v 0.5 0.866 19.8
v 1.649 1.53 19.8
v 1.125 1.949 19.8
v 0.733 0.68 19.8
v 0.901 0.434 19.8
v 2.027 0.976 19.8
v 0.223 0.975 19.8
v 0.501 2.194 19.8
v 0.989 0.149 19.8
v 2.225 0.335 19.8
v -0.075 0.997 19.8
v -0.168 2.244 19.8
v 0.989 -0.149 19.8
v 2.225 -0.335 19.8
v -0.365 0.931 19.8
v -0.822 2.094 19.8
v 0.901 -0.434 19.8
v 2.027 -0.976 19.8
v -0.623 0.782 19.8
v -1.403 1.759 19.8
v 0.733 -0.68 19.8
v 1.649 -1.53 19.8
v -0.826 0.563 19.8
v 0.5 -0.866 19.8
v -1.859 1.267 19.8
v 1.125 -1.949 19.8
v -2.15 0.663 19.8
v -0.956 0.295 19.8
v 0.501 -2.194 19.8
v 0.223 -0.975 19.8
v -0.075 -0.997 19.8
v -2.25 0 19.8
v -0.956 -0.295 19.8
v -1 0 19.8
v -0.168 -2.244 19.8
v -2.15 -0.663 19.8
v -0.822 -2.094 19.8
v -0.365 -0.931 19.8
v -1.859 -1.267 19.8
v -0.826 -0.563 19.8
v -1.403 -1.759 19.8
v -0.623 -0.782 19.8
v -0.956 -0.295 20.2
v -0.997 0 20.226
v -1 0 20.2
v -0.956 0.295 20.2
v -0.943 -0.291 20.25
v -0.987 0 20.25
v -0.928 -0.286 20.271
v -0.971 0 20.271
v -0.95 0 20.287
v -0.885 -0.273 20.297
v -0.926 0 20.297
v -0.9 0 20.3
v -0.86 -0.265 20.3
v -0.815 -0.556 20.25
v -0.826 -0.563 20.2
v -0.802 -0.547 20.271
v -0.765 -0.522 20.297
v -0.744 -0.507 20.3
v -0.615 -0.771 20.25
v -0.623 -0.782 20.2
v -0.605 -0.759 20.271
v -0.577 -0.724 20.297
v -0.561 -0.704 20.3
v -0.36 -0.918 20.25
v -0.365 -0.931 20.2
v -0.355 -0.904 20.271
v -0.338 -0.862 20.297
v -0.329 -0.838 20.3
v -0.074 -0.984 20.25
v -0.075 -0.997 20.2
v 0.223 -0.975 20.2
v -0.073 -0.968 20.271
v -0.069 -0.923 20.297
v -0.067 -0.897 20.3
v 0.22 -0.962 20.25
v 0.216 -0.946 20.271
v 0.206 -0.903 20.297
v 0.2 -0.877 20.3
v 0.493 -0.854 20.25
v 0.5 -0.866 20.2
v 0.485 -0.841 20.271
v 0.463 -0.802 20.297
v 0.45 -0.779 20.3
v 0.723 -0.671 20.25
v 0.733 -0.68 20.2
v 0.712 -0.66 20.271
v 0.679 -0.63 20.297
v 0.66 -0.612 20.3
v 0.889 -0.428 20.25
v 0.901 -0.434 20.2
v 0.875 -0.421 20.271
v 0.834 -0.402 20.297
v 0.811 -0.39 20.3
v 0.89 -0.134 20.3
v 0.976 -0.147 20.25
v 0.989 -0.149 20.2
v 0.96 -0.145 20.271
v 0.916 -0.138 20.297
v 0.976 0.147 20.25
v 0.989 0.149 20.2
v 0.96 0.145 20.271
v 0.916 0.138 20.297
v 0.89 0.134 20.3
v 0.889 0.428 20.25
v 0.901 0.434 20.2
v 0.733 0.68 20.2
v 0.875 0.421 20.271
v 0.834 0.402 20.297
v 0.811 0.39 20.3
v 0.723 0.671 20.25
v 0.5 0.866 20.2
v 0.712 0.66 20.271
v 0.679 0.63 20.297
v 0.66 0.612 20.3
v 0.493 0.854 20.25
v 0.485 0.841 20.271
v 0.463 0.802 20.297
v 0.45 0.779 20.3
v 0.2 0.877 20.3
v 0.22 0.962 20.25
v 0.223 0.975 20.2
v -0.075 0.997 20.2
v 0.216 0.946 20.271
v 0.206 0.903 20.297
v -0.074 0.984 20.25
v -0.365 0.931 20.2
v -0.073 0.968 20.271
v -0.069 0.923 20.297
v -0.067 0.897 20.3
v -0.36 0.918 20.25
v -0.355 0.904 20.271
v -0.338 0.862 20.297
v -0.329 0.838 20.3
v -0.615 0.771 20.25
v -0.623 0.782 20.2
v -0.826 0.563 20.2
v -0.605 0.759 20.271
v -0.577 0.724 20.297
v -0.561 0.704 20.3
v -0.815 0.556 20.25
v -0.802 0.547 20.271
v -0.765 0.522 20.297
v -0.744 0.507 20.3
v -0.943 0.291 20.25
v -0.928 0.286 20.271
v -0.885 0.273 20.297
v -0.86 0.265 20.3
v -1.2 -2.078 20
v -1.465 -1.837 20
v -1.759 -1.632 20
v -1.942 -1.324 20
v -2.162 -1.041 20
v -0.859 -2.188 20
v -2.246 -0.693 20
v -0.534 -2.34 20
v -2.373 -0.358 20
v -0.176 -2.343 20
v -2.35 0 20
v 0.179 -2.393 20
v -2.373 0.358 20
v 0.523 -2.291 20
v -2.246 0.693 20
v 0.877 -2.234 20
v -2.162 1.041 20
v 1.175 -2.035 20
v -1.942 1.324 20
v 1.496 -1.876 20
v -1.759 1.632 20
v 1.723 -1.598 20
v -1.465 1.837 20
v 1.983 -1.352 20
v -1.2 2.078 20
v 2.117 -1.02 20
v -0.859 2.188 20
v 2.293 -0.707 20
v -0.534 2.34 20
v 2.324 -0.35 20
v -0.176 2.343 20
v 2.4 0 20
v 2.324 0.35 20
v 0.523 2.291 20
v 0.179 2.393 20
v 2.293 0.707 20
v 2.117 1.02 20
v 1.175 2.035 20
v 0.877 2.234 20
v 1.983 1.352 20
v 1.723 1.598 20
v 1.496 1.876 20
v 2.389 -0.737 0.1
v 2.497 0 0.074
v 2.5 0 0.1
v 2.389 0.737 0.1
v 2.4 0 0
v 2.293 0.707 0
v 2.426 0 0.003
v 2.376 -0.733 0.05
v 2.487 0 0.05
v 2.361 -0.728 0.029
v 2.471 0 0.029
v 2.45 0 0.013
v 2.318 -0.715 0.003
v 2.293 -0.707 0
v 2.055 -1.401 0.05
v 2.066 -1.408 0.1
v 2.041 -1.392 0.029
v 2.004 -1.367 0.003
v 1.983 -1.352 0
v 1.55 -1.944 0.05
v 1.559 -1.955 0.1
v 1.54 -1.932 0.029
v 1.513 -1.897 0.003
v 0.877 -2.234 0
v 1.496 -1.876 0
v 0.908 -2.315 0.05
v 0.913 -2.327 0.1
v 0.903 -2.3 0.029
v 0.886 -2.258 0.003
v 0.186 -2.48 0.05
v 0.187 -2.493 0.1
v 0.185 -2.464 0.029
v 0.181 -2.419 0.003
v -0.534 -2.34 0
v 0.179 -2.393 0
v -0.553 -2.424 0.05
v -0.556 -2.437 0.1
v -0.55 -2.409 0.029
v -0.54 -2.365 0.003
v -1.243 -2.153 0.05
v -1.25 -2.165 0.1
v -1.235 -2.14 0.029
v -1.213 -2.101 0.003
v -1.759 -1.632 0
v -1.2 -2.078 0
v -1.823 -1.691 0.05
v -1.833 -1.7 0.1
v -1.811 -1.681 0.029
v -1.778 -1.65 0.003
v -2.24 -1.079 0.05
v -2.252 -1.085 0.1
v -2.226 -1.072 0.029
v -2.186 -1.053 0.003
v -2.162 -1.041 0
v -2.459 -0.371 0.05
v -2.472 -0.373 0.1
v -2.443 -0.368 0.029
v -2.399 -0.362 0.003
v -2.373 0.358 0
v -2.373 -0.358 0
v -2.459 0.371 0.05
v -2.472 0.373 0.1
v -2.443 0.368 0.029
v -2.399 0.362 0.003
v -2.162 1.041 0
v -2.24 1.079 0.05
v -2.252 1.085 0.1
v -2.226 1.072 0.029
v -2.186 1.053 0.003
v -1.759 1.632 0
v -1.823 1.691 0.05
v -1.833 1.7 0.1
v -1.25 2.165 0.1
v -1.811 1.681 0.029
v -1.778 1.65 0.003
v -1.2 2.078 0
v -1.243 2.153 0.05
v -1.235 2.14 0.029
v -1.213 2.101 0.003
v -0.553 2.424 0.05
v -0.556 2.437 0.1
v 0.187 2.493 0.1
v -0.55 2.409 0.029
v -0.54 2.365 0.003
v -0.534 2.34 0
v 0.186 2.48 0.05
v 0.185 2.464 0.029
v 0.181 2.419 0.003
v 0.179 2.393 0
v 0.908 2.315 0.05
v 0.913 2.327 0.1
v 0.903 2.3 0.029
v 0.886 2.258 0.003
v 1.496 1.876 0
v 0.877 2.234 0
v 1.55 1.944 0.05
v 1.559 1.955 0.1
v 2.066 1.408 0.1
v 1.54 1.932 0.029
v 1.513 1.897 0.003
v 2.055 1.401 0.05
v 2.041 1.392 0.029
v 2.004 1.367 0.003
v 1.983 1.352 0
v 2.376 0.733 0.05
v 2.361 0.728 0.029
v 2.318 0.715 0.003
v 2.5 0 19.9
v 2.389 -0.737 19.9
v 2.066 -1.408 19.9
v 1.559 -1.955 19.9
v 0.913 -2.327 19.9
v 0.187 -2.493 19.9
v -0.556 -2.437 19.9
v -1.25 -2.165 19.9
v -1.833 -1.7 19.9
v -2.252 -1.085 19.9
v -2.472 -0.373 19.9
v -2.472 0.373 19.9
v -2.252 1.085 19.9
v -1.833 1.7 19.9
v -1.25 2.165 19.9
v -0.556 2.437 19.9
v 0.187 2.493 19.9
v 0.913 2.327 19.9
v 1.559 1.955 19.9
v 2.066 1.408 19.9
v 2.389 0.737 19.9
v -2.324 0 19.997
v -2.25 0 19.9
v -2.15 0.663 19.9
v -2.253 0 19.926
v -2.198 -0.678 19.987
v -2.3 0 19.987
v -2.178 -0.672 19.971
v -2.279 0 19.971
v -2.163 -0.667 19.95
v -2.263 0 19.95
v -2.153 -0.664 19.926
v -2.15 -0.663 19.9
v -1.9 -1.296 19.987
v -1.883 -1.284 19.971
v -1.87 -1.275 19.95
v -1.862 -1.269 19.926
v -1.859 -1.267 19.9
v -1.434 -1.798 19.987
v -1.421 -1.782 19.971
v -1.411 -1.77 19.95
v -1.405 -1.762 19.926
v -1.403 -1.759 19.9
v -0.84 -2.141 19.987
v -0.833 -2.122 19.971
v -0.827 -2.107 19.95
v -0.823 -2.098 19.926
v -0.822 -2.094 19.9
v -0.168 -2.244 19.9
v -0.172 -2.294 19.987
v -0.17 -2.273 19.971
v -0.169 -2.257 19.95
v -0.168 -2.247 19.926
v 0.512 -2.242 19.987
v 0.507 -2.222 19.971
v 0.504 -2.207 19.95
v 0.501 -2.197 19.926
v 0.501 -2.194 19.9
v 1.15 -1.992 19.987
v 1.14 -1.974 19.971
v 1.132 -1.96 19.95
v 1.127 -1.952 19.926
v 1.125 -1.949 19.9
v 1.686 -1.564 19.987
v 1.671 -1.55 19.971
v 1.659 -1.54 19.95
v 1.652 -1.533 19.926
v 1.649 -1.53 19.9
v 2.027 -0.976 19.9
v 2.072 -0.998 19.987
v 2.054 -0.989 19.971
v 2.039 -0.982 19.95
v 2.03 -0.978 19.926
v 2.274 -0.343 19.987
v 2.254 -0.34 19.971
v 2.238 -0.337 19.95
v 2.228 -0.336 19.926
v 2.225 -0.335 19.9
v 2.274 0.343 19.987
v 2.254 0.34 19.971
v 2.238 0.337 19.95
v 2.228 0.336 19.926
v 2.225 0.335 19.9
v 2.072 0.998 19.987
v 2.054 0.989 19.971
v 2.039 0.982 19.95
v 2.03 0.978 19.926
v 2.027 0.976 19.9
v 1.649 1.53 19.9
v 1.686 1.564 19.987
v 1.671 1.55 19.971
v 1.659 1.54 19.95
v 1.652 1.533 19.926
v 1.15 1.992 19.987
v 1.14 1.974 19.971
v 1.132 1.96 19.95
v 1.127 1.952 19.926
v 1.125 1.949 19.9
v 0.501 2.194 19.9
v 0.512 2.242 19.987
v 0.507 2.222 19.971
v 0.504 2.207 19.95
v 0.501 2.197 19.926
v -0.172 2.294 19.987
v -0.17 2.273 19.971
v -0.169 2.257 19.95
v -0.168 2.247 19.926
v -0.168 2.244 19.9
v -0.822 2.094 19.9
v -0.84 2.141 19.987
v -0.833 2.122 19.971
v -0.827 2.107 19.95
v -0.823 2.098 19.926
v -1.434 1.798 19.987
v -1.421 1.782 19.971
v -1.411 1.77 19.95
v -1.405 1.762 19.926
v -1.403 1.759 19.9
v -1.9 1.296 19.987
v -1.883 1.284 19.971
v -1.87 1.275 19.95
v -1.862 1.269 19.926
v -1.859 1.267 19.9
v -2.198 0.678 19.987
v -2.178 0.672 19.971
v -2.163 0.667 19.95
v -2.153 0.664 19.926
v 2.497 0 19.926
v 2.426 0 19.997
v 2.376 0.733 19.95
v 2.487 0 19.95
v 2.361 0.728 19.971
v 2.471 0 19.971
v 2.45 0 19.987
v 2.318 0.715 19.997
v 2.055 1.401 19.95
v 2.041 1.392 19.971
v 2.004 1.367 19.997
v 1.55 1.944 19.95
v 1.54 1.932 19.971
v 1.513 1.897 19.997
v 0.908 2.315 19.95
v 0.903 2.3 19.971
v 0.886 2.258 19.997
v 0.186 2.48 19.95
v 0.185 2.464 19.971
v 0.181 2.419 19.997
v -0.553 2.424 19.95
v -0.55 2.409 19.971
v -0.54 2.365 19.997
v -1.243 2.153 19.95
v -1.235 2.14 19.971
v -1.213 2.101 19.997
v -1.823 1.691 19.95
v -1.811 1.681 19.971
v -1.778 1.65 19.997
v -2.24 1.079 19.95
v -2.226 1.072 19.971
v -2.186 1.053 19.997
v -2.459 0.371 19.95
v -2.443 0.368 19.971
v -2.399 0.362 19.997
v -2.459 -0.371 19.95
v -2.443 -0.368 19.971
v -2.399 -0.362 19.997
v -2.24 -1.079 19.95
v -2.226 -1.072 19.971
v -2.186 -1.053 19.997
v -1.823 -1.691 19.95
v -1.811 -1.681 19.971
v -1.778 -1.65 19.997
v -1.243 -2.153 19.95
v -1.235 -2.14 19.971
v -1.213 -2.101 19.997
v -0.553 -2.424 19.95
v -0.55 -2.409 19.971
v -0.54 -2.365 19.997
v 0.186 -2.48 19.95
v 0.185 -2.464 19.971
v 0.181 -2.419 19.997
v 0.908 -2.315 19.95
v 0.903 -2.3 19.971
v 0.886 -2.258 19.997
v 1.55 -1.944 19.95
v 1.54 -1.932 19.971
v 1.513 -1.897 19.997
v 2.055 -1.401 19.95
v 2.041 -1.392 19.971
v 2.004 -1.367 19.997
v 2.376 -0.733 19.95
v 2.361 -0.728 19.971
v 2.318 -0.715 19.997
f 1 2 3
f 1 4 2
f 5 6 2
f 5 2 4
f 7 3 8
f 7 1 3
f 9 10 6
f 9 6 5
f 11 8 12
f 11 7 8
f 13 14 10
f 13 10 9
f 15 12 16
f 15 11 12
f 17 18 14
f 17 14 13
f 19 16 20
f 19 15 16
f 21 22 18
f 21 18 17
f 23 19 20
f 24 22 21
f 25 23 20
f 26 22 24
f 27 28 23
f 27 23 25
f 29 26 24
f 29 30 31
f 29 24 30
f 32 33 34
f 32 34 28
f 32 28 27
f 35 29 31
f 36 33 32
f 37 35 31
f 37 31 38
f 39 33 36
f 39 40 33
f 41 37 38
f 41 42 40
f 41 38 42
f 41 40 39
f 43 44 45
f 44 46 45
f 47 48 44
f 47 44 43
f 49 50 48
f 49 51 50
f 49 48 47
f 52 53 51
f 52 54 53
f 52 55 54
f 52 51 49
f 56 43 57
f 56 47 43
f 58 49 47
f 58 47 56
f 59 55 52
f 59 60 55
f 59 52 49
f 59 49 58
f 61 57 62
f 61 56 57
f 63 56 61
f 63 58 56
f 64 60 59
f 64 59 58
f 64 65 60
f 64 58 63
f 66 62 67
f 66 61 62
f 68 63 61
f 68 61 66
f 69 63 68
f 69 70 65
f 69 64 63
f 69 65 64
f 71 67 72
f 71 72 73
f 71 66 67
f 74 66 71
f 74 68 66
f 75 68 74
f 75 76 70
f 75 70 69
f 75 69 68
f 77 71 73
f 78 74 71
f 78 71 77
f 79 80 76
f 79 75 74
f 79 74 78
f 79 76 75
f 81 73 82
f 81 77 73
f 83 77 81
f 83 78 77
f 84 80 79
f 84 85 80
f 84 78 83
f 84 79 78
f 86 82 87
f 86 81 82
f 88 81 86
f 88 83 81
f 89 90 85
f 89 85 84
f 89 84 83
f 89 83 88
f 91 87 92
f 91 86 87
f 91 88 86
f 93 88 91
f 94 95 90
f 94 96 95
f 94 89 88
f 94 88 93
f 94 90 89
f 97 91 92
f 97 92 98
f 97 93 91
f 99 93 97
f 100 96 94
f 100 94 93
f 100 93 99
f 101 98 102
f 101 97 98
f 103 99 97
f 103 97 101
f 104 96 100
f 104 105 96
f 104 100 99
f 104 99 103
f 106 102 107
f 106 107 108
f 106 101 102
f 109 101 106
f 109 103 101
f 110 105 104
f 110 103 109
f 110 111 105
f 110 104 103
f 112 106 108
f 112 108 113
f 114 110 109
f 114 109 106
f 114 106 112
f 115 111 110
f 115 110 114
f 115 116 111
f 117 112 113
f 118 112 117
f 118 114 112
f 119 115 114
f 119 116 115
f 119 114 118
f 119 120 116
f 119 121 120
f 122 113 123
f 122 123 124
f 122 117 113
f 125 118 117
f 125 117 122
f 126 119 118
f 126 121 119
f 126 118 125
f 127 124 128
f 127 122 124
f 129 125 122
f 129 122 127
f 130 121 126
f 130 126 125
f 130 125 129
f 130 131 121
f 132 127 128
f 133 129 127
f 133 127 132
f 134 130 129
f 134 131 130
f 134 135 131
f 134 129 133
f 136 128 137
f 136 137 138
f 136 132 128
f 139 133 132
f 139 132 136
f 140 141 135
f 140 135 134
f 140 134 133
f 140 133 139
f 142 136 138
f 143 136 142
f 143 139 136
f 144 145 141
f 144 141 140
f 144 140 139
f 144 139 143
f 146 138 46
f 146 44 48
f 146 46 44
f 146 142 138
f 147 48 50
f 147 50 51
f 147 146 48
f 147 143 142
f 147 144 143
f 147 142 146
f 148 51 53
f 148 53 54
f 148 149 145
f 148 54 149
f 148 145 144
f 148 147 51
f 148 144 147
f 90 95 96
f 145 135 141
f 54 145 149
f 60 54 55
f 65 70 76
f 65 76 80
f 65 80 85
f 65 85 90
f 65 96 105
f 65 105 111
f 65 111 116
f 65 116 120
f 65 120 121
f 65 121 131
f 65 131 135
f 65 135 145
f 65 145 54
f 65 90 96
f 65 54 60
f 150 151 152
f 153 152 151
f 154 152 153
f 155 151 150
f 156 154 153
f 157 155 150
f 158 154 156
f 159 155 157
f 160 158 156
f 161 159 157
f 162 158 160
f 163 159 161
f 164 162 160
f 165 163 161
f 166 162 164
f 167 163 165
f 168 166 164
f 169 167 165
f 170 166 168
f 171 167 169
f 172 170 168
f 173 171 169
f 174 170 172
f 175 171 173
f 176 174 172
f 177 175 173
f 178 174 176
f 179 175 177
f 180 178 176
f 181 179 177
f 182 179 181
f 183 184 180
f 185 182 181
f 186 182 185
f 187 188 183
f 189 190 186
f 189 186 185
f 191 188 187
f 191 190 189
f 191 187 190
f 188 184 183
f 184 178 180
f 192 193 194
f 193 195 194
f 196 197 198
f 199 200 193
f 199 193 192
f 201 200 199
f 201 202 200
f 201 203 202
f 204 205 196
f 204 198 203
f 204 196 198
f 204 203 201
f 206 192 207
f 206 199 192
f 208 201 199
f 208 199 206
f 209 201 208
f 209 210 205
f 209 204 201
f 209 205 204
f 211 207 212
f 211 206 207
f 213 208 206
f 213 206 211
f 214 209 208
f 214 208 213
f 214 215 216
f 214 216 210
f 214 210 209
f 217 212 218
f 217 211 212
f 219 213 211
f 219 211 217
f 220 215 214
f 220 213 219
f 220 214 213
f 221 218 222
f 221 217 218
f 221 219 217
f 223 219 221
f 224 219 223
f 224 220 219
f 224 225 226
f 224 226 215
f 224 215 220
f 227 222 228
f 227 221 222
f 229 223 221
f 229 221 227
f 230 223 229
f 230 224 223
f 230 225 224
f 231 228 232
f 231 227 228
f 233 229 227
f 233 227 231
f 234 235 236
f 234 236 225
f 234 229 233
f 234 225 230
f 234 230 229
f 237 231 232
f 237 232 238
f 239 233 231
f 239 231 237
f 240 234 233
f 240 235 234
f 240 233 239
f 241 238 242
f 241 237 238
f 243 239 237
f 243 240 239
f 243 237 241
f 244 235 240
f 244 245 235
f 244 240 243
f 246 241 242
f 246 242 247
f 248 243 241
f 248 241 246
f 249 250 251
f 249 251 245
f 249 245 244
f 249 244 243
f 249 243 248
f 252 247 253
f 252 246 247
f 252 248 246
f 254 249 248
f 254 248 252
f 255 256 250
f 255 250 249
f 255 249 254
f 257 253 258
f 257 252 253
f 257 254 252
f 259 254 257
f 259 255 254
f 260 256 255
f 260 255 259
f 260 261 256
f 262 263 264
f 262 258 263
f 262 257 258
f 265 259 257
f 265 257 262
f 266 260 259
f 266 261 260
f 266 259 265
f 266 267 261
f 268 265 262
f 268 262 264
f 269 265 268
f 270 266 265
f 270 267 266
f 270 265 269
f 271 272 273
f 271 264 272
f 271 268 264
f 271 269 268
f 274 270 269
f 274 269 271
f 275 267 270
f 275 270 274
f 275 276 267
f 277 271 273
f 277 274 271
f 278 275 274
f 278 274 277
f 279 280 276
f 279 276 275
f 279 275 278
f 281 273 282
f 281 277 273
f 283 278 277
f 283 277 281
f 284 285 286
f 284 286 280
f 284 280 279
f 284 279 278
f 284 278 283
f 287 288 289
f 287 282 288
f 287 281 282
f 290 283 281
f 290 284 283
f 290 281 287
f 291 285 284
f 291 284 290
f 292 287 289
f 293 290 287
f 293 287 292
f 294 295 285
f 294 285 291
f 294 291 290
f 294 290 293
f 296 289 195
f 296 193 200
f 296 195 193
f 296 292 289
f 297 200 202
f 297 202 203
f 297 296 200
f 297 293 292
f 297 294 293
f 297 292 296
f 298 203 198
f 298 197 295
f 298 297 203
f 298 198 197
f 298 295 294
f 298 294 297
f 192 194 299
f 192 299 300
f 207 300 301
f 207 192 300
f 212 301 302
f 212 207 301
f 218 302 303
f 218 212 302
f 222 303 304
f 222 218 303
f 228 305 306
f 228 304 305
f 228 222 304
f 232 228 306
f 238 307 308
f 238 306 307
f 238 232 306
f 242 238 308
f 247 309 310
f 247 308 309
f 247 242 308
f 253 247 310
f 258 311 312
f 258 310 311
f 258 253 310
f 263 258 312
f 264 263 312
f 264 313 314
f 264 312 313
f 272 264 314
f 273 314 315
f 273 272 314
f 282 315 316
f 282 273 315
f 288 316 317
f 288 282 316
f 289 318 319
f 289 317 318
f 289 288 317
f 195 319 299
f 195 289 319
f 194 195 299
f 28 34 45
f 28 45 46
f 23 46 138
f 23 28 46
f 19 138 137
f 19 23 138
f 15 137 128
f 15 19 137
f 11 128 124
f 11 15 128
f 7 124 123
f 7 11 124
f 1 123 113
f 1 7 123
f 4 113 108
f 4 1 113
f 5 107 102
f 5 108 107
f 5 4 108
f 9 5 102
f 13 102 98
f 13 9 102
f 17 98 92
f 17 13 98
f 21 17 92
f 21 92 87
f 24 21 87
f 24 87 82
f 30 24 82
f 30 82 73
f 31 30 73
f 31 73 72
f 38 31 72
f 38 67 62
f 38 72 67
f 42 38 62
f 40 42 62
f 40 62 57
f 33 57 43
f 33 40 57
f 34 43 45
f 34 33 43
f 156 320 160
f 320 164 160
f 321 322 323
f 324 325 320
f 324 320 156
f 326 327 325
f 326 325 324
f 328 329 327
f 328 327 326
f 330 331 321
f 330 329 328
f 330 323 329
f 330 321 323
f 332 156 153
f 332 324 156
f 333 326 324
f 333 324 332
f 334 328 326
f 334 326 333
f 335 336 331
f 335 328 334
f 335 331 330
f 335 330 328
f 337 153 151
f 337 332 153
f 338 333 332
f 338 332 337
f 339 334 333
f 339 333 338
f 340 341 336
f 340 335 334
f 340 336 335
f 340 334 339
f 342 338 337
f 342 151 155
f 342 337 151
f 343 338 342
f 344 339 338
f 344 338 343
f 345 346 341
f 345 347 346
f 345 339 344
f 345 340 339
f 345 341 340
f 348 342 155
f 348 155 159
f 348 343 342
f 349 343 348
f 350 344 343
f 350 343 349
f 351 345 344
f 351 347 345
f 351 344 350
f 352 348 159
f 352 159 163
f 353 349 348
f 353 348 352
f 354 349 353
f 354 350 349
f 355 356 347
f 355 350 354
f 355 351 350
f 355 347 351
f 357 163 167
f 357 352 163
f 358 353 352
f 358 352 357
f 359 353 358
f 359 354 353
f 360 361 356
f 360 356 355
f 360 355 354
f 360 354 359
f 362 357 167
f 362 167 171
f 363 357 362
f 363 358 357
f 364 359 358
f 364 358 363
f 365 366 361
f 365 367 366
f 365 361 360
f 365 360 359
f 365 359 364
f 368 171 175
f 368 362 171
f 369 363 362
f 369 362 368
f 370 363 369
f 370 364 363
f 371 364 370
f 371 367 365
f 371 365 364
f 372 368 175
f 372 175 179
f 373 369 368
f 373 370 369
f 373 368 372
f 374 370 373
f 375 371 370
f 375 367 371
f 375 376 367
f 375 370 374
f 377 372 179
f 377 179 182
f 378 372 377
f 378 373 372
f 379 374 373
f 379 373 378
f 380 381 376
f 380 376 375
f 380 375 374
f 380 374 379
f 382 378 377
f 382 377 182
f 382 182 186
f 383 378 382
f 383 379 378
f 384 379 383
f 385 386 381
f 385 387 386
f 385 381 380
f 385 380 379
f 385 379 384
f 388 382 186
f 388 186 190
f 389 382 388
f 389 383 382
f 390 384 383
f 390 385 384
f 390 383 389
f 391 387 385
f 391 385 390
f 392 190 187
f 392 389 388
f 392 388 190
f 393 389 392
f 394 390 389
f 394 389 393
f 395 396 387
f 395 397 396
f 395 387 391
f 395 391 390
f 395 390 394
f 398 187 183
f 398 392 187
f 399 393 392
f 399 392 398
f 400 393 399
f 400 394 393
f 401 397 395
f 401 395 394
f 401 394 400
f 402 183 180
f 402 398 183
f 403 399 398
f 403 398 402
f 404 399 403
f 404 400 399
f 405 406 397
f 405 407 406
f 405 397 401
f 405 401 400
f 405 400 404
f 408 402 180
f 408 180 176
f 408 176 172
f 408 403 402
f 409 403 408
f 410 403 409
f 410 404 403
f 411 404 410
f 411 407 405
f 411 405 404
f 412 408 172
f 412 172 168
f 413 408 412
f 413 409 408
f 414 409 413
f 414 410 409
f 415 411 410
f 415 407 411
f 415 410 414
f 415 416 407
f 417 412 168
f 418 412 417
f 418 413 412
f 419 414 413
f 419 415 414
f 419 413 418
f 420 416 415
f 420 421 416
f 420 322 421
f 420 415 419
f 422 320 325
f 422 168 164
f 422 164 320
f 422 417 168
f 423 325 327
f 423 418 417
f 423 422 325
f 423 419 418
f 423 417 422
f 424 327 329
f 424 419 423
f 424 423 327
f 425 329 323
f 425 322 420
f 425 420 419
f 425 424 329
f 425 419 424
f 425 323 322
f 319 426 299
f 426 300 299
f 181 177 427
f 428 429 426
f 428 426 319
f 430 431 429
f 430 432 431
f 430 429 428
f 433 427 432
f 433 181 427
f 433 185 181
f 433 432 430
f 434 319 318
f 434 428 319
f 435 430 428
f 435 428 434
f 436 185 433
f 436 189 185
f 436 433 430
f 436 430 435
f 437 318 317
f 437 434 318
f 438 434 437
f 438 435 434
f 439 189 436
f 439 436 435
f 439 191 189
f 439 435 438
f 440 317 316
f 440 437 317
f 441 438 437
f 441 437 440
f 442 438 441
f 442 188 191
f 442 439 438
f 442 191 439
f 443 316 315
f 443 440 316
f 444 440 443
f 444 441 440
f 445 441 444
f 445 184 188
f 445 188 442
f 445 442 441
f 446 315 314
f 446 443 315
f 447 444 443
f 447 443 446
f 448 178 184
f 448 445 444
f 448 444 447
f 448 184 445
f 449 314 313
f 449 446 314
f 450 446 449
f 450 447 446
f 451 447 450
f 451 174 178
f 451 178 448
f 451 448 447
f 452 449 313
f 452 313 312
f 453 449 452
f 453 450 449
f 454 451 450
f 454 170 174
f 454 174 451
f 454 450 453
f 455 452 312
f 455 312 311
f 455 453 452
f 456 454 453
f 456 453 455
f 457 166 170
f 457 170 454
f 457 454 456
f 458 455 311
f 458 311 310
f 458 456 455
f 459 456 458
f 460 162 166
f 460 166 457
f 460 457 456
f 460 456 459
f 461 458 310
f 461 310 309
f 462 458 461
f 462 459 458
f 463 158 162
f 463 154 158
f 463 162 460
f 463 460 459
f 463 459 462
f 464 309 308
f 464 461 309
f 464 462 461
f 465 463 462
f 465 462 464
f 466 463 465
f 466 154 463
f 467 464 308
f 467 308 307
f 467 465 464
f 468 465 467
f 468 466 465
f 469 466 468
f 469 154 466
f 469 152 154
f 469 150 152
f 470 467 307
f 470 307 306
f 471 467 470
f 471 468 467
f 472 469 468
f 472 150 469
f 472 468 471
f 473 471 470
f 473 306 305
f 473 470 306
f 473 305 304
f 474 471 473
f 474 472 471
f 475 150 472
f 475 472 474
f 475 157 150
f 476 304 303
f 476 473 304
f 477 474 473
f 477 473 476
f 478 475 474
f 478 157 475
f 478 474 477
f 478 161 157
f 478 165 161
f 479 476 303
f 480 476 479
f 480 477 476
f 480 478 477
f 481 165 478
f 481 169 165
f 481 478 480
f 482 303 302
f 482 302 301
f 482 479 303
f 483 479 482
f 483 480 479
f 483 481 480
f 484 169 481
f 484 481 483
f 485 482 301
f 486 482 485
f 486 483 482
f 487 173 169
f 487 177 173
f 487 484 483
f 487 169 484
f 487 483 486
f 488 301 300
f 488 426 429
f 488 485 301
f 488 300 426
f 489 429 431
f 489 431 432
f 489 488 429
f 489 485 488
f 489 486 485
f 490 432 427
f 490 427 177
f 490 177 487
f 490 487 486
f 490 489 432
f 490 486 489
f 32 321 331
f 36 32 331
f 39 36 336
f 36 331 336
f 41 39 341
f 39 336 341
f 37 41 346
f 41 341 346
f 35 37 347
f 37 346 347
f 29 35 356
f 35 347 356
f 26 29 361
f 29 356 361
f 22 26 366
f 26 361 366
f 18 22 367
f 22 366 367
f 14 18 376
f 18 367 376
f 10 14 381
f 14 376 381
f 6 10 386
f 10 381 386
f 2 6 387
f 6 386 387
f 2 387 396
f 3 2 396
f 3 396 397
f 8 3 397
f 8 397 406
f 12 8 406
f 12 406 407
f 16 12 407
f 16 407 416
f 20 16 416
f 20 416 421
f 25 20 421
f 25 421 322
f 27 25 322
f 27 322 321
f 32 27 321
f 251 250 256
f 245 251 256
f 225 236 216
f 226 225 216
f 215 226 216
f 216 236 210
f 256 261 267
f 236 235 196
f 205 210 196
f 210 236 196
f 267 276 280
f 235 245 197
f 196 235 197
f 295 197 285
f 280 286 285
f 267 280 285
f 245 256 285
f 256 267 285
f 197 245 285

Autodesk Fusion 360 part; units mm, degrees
sketch "Sketch1" plane through (0, 0, 0) normal (0, 0, 1) x (1, 0, 0)
  circle A0 centre (0, 0) radius 2.5
  dimension "d1" = 5
extrude "Extrude1" add sketch "Sketch1" along normal blind 20
fillet "Fillet1" radius 0.1 1 edges at (-2.3308, -0.904, 0)
fillet "Fillet2" radius 0.1 1 edges at (-2.3308, -0.904, 20)
sketch "Sketch2" plane through (0, 0, 20) normal (0, 0, 1) x (-1, 0, 0)
  circle A0 centre (0, 0) radius 2.4
  circle A1 centre (0, 0) radius 2.25
  dimension "d8" = 4.5
extrude "Extrude2" cut sketch "Sketch2" against normal blind 0.2 contours A1
fillet "Fillet3" radius 0.1 1 edges at (2.0977, -0.8136, 20)
sketch "Sketch3" plane through (0, 0, 19.8) normal (0, 0, 1) x (-1, 0, 0)
  circle A0 centre (0, 0) radius 2.25
  circle A1 centre (0, 0) radius 1
  dimension "d13" = 2
extrude "Extrude3" add sketch "Sketch3" along normal blind 0.5 contours A1
fillet "Fillet4" radius 0.1 1 edges at (0.9323, 0.3616, 20.3)
